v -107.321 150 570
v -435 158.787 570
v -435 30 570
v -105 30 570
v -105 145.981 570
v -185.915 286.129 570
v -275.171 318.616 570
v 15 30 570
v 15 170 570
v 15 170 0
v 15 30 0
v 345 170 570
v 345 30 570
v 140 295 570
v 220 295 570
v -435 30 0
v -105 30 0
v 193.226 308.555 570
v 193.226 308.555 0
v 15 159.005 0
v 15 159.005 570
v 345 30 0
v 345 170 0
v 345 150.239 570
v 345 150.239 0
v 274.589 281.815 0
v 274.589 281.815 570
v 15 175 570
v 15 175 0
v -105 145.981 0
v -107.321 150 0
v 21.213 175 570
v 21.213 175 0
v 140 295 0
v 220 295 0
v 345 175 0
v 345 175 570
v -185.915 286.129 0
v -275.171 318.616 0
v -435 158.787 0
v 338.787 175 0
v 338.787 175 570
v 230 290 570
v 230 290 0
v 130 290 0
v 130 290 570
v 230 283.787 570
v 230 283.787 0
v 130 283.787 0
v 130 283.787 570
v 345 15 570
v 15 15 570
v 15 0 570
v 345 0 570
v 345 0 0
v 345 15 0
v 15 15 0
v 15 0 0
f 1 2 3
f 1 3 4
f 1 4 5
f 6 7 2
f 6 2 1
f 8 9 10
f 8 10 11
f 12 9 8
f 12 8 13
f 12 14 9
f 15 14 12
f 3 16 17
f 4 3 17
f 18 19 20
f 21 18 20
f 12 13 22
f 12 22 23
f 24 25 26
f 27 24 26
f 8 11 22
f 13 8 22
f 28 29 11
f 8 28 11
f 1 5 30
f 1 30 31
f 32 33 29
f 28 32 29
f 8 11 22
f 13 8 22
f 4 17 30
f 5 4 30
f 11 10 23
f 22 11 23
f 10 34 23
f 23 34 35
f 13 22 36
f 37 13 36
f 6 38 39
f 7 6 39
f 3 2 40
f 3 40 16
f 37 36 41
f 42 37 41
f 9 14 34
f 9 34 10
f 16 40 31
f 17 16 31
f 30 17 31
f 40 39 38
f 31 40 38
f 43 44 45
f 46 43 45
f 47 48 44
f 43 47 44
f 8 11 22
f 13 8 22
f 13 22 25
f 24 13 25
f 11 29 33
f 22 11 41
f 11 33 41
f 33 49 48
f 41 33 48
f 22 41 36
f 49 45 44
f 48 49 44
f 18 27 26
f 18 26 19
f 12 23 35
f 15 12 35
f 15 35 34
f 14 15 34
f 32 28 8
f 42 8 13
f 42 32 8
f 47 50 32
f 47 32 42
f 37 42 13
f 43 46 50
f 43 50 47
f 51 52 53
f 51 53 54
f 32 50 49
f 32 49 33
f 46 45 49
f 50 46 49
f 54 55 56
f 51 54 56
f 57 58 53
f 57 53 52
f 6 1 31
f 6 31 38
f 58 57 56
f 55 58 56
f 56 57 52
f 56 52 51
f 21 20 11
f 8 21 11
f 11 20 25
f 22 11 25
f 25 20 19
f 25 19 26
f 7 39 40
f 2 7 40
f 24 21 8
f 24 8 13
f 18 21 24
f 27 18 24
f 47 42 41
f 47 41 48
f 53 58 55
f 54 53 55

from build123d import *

# Parameters (mm, degrees)
F2_DEPTH = 570
F5_DEPTH = 570
F4_W     = 330
F4_H     = 15
F6_DEPTH = 570
F8_DEPTH = 570
F9_DEPTH = 570


with BuildPart() as f2:
    # F1 (on Top) → F2 (new body)
    with BuildSketch(Plane.XY):
        Polygon((15, 159.005385), (15, 30), (345, 30), (345, 150.238831), (274.589164, 281.814746), (193.226107, 308.554846), align=None)
    extrude(amount=F2_DEPTH)


with BuildPart() as f5:
    # F4 (on Top) → F5 (new body)
    with BuildSketch(Plane.XY):
        Polygon((15, 170), (15, 30), (345, 30), (345, 170), (220, 295), (140, 295), align=None)
    extrude(amount=F5_DEPTH)


with BuildPart() as f6:
    # F4 (on Top) → F6 (new body)
    with BuildSketch(Plane.XY):
        with Locations((180, 7.5)):
            Rectangle(F4_W, F4_H)
    extrude(amount=F6_DEPTH)


with BuildPart() as f8:
    # F7 (on Top) → F8 (new body)
    with BuildSketch(Plane.XY):
        Polygon((-275.170926, 318.615871), (-435, 158.786797), (-435, 150), (-435, 30), (-105, 30), (-105, 141.339746), (-105, 145.980762), (-107.320508, 150), (-185.914793, 286.129295), align=None)
    extrude(amount=F8_DEPTH)


with BuildPart() as f9:
    # F3 (on Top) → F9 (new body)
    with BuildSketch(Plane.XY):
        Polygon((15, 175), (15, 30), (345, 30), (345, 175), (338.786797, 175), (230, 283.786797), (230, 290), (130, 290), (130, 283.786797), (21.213203, 175), align=None)
    extrude(amount=F9_DEPTH)


solid = Compound([f2.part, f5.part, f6.part, f8.part, f9.part])
